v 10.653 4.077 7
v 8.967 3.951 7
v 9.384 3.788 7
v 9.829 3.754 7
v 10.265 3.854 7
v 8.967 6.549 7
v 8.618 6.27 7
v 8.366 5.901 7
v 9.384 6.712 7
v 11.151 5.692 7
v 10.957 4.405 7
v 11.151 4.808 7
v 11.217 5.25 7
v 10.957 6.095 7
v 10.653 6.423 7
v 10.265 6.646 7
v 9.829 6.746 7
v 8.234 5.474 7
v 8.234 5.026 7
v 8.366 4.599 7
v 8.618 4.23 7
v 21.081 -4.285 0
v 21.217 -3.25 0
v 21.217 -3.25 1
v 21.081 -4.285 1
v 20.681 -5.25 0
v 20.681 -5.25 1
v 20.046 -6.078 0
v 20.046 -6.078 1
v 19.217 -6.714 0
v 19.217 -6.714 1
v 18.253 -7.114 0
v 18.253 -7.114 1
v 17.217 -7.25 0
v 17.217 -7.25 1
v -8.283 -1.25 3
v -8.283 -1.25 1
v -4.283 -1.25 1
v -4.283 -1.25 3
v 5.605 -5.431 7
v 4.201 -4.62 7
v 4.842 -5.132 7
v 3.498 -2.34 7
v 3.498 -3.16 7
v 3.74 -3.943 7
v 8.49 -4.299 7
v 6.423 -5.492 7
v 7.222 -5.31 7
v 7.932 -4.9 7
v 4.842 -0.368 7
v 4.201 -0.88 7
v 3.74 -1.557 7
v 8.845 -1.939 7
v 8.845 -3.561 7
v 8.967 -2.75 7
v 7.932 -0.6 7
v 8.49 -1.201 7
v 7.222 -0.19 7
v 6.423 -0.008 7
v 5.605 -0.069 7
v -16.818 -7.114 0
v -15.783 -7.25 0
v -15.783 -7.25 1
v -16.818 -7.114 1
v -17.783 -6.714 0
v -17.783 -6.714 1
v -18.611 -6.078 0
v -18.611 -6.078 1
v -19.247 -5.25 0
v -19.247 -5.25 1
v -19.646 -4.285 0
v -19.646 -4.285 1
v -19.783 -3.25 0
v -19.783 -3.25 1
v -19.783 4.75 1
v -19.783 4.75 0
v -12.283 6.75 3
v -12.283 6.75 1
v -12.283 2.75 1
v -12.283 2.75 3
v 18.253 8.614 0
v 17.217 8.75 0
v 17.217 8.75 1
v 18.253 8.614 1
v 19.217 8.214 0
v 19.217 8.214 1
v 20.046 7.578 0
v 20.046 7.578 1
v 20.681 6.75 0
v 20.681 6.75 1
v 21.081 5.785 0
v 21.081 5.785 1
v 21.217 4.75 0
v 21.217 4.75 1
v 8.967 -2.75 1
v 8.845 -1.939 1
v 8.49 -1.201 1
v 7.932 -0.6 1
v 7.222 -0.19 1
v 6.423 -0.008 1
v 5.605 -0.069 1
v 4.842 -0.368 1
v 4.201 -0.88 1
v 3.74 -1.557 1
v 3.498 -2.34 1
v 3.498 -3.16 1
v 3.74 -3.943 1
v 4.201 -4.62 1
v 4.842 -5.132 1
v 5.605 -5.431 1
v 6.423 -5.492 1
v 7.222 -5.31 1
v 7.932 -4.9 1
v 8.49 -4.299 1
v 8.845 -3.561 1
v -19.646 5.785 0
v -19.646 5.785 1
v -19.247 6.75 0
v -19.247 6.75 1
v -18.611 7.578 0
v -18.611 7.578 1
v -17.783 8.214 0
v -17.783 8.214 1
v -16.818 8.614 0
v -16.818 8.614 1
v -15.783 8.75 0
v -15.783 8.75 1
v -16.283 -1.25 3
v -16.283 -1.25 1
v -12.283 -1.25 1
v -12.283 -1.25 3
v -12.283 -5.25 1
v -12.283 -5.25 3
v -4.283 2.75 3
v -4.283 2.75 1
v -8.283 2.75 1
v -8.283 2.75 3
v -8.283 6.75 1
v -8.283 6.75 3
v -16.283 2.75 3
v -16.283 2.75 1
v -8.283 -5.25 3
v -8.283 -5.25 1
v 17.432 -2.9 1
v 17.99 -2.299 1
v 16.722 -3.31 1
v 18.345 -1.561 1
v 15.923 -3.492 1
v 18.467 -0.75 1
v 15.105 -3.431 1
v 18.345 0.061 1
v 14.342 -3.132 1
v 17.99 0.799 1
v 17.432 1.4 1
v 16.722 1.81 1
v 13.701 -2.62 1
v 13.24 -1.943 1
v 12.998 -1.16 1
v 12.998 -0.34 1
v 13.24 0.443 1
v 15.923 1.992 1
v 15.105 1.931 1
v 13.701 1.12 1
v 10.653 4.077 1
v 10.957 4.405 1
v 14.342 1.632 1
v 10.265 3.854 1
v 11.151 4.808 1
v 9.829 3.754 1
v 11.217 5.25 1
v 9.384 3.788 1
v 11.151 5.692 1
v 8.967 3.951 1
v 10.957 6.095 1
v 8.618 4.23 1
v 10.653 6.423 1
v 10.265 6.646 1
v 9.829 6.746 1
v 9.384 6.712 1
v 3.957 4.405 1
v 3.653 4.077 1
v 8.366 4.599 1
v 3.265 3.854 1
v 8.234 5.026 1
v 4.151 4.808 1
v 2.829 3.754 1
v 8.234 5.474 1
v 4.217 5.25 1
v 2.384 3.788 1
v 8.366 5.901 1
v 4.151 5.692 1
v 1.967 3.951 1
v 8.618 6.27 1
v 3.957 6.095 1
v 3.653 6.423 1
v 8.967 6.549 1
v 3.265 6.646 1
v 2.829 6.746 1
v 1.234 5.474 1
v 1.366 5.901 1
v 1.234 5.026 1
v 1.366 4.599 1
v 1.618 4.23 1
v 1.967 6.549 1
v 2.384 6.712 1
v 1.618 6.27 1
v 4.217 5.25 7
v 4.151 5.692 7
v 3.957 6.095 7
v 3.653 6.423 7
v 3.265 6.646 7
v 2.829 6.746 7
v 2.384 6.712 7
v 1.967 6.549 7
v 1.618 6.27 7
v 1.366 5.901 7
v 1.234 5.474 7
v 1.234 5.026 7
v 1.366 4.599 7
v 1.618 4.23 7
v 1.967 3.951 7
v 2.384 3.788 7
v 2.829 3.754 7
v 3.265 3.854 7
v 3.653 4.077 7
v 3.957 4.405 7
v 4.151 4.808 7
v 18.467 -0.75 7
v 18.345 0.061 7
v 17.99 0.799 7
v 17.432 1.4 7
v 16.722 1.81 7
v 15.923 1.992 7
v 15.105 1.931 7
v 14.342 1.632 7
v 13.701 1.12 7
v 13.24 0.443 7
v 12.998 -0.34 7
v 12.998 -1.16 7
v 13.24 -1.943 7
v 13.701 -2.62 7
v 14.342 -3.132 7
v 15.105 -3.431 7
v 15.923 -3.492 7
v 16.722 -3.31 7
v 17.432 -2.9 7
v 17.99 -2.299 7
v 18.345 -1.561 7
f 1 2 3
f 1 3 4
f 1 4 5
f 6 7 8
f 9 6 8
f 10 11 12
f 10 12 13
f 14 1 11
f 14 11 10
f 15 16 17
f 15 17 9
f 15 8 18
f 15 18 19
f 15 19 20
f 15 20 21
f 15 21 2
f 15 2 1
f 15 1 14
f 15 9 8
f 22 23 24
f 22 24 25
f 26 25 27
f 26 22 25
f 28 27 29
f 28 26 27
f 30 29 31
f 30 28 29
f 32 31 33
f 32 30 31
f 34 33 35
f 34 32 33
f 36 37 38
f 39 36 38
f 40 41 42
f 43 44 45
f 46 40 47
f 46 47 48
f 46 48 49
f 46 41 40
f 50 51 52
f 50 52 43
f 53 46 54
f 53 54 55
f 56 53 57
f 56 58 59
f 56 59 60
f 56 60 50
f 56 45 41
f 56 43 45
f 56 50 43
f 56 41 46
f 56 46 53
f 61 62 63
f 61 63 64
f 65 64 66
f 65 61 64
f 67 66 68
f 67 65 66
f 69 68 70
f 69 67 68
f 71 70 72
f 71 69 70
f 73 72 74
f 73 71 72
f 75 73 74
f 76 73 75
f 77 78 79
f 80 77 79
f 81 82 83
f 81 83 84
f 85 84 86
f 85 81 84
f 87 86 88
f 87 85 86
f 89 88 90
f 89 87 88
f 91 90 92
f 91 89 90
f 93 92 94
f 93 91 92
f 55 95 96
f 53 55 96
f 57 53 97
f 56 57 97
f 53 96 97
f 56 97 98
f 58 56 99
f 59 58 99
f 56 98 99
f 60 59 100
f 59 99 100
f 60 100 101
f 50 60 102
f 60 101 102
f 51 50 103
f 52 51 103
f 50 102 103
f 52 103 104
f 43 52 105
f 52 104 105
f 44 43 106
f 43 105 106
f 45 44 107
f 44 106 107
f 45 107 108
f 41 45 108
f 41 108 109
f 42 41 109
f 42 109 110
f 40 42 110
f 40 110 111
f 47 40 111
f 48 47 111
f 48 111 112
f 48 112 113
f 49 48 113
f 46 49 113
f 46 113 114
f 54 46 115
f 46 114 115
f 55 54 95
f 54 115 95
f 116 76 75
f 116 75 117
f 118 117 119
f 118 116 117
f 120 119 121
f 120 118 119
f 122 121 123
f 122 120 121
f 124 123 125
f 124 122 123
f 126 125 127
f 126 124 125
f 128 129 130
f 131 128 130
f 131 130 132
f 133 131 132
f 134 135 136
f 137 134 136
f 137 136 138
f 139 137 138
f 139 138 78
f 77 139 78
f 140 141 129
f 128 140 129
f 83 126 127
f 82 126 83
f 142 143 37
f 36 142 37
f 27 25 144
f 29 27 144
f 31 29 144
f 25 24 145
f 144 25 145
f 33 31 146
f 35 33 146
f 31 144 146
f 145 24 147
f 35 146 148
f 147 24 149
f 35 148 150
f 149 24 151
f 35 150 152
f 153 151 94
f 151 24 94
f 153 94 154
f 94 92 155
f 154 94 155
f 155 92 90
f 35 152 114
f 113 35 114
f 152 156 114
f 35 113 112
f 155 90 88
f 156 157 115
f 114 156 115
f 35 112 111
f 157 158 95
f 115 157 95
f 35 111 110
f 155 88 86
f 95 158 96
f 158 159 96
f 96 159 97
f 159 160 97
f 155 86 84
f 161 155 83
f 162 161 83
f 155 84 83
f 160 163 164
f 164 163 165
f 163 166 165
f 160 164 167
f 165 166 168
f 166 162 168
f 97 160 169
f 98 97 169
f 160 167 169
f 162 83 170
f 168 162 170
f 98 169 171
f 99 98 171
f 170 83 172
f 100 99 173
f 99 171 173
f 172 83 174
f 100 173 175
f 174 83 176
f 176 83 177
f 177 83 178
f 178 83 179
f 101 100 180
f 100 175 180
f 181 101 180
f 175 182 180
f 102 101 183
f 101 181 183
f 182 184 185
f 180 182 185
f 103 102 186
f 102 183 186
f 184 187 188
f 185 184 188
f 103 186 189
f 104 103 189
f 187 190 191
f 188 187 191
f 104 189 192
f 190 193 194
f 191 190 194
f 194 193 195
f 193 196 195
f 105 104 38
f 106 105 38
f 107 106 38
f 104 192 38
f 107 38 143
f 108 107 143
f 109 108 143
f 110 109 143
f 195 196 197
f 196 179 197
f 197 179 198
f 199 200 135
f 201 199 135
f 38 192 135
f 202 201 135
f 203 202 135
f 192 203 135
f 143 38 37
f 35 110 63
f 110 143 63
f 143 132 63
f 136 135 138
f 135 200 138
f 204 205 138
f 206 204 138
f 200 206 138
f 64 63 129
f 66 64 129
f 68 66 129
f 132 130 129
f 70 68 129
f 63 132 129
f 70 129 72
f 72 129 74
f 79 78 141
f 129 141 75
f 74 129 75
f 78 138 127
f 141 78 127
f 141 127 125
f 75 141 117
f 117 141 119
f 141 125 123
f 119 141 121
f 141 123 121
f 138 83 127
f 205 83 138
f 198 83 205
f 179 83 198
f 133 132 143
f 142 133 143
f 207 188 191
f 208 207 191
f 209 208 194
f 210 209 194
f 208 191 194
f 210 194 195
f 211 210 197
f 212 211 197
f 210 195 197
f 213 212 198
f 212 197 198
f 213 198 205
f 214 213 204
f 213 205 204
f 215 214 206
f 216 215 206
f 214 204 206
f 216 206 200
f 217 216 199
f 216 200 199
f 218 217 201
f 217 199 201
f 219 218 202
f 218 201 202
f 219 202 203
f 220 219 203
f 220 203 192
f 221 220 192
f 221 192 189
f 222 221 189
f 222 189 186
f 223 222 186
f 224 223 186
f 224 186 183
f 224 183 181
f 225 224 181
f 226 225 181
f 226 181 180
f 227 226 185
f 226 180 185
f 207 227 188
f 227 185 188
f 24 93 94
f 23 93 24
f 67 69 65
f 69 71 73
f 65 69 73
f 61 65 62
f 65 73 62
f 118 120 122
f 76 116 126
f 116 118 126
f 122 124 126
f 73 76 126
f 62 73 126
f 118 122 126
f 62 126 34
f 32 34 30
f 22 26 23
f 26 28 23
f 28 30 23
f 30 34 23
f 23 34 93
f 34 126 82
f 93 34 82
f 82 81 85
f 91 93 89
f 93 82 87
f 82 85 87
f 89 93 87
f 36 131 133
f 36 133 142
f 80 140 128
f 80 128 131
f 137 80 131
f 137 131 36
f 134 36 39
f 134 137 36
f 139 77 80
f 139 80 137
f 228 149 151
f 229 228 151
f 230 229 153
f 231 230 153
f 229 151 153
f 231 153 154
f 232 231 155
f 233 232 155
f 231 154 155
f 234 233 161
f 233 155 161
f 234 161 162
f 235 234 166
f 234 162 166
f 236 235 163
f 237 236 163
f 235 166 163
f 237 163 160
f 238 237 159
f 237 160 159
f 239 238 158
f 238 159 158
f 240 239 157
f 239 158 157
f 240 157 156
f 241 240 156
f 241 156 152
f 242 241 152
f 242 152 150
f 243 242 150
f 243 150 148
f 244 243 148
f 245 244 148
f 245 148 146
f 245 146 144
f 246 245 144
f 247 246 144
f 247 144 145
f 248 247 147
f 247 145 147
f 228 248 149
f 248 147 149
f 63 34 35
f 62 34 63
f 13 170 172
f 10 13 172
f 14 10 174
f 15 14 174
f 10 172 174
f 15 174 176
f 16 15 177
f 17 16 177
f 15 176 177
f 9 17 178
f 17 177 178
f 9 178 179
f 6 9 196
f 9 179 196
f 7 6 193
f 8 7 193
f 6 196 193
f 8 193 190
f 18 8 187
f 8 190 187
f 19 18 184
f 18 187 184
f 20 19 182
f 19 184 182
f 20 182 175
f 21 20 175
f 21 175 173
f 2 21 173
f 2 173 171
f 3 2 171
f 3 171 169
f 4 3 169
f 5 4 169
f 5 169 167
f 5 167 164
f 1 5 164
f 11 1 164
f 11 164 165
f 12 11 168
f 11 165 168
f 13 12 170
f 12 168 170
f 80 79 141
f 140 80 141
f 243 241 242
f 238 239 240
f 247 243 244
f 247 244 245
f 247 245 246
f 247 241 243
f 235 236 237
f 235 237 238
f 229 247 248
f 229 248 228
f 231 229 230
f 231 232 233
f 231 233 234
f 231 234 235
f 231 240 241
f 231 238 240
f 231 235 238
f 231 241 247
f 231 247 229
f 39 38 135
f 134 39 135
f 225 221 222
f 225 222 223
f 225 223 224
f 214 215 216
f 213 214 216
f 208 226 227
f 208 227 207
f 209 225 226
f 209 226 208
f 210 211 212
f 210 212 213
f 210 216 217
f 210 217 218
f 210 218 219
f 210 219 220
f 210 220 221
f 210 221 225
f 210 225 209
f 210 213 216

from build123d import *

# Parameters (mm, degrees)
EXTRUDE_1_DEPTH = 1
SKETCH_3_R      = 1.5
SKETCH_3_R_2    = 2.75
EXTRUDE_2_DEPTH = 6
EXTRUDE_3_DEPTH = 3


with BuildPart() as part:
    # 草图1 → 凸台-拉伸1 (new body)
    with BuildSketch(Plane.XY):
        with BuildLine():
            Line((-15.782608696, 8.75), (17.217391304, 8.75))
            ThreePointArc((17.217391304, 8.75), (20.045818429, 7.578427125), (21.217391304, 4.75))
            Line((21.217391304, 4.75), (21.217391304, -3.25))
            ThreePointArc((21.217391304, -3.25), (20.045818429, -6.078427125), (17.217391304, -7.25))
            Line((17.217391304, -7.25), (-15.782608696, -7.25))
            ThreePointArc((-15.782608696, -7.25), (-18.61103582, -6.078427125), (-19.782608696, -3.25))
            Line((-19.782608696, -3.25), (-19.782608696, 4.75))
            ThreePointArc((-19.782608696, 4.75), (-18.61103582, 7.578427125), (-15.782608696, 8.75))
        make_face()
    extrude(amount=EXTRUDE_1_DEPTH)

    # 草图3 → 凸台-拉伸2 (add)
    with BuildSketch(Plane.XY.offset(1)):
        with Locations((2.717391304, 5.25)):
            Circle(SKETCH_3_R)
        with Locations((9.717391304, 5.25)):
            Circle(SKETCH_3_R)
        with Locations((6.217391304, -2.75)):
            Circle(SKETCH_3_R_2)
        with Locations((15.717391304, -0.75)):
            Circle(SKETCH_3_R_2)
    extrude(amount=EXTRUDE_2_DEPTH)

    # 草图4 → 凸台-拉伸3 (add)
    with BuildSketch(Plane.XY):
        Polygon((-8.282608696, 2.75), (-8.282608696, 6.75), (-12.282608696, 6.75), (-12.282608696, 2.75), (-16.282608696, 2.75), (-16.282608696, -1.25), (-12.282608696, -1.25), (-12.282608696, -5.25), (-8.282608696, -5.25), (-8.282608696, -1.25), (-4.282608696, -1.25), (-4.282608696, 2.75), align=None)
    extrude(amount=EXTRUDE_3_DEPTH)


solid = part.part
